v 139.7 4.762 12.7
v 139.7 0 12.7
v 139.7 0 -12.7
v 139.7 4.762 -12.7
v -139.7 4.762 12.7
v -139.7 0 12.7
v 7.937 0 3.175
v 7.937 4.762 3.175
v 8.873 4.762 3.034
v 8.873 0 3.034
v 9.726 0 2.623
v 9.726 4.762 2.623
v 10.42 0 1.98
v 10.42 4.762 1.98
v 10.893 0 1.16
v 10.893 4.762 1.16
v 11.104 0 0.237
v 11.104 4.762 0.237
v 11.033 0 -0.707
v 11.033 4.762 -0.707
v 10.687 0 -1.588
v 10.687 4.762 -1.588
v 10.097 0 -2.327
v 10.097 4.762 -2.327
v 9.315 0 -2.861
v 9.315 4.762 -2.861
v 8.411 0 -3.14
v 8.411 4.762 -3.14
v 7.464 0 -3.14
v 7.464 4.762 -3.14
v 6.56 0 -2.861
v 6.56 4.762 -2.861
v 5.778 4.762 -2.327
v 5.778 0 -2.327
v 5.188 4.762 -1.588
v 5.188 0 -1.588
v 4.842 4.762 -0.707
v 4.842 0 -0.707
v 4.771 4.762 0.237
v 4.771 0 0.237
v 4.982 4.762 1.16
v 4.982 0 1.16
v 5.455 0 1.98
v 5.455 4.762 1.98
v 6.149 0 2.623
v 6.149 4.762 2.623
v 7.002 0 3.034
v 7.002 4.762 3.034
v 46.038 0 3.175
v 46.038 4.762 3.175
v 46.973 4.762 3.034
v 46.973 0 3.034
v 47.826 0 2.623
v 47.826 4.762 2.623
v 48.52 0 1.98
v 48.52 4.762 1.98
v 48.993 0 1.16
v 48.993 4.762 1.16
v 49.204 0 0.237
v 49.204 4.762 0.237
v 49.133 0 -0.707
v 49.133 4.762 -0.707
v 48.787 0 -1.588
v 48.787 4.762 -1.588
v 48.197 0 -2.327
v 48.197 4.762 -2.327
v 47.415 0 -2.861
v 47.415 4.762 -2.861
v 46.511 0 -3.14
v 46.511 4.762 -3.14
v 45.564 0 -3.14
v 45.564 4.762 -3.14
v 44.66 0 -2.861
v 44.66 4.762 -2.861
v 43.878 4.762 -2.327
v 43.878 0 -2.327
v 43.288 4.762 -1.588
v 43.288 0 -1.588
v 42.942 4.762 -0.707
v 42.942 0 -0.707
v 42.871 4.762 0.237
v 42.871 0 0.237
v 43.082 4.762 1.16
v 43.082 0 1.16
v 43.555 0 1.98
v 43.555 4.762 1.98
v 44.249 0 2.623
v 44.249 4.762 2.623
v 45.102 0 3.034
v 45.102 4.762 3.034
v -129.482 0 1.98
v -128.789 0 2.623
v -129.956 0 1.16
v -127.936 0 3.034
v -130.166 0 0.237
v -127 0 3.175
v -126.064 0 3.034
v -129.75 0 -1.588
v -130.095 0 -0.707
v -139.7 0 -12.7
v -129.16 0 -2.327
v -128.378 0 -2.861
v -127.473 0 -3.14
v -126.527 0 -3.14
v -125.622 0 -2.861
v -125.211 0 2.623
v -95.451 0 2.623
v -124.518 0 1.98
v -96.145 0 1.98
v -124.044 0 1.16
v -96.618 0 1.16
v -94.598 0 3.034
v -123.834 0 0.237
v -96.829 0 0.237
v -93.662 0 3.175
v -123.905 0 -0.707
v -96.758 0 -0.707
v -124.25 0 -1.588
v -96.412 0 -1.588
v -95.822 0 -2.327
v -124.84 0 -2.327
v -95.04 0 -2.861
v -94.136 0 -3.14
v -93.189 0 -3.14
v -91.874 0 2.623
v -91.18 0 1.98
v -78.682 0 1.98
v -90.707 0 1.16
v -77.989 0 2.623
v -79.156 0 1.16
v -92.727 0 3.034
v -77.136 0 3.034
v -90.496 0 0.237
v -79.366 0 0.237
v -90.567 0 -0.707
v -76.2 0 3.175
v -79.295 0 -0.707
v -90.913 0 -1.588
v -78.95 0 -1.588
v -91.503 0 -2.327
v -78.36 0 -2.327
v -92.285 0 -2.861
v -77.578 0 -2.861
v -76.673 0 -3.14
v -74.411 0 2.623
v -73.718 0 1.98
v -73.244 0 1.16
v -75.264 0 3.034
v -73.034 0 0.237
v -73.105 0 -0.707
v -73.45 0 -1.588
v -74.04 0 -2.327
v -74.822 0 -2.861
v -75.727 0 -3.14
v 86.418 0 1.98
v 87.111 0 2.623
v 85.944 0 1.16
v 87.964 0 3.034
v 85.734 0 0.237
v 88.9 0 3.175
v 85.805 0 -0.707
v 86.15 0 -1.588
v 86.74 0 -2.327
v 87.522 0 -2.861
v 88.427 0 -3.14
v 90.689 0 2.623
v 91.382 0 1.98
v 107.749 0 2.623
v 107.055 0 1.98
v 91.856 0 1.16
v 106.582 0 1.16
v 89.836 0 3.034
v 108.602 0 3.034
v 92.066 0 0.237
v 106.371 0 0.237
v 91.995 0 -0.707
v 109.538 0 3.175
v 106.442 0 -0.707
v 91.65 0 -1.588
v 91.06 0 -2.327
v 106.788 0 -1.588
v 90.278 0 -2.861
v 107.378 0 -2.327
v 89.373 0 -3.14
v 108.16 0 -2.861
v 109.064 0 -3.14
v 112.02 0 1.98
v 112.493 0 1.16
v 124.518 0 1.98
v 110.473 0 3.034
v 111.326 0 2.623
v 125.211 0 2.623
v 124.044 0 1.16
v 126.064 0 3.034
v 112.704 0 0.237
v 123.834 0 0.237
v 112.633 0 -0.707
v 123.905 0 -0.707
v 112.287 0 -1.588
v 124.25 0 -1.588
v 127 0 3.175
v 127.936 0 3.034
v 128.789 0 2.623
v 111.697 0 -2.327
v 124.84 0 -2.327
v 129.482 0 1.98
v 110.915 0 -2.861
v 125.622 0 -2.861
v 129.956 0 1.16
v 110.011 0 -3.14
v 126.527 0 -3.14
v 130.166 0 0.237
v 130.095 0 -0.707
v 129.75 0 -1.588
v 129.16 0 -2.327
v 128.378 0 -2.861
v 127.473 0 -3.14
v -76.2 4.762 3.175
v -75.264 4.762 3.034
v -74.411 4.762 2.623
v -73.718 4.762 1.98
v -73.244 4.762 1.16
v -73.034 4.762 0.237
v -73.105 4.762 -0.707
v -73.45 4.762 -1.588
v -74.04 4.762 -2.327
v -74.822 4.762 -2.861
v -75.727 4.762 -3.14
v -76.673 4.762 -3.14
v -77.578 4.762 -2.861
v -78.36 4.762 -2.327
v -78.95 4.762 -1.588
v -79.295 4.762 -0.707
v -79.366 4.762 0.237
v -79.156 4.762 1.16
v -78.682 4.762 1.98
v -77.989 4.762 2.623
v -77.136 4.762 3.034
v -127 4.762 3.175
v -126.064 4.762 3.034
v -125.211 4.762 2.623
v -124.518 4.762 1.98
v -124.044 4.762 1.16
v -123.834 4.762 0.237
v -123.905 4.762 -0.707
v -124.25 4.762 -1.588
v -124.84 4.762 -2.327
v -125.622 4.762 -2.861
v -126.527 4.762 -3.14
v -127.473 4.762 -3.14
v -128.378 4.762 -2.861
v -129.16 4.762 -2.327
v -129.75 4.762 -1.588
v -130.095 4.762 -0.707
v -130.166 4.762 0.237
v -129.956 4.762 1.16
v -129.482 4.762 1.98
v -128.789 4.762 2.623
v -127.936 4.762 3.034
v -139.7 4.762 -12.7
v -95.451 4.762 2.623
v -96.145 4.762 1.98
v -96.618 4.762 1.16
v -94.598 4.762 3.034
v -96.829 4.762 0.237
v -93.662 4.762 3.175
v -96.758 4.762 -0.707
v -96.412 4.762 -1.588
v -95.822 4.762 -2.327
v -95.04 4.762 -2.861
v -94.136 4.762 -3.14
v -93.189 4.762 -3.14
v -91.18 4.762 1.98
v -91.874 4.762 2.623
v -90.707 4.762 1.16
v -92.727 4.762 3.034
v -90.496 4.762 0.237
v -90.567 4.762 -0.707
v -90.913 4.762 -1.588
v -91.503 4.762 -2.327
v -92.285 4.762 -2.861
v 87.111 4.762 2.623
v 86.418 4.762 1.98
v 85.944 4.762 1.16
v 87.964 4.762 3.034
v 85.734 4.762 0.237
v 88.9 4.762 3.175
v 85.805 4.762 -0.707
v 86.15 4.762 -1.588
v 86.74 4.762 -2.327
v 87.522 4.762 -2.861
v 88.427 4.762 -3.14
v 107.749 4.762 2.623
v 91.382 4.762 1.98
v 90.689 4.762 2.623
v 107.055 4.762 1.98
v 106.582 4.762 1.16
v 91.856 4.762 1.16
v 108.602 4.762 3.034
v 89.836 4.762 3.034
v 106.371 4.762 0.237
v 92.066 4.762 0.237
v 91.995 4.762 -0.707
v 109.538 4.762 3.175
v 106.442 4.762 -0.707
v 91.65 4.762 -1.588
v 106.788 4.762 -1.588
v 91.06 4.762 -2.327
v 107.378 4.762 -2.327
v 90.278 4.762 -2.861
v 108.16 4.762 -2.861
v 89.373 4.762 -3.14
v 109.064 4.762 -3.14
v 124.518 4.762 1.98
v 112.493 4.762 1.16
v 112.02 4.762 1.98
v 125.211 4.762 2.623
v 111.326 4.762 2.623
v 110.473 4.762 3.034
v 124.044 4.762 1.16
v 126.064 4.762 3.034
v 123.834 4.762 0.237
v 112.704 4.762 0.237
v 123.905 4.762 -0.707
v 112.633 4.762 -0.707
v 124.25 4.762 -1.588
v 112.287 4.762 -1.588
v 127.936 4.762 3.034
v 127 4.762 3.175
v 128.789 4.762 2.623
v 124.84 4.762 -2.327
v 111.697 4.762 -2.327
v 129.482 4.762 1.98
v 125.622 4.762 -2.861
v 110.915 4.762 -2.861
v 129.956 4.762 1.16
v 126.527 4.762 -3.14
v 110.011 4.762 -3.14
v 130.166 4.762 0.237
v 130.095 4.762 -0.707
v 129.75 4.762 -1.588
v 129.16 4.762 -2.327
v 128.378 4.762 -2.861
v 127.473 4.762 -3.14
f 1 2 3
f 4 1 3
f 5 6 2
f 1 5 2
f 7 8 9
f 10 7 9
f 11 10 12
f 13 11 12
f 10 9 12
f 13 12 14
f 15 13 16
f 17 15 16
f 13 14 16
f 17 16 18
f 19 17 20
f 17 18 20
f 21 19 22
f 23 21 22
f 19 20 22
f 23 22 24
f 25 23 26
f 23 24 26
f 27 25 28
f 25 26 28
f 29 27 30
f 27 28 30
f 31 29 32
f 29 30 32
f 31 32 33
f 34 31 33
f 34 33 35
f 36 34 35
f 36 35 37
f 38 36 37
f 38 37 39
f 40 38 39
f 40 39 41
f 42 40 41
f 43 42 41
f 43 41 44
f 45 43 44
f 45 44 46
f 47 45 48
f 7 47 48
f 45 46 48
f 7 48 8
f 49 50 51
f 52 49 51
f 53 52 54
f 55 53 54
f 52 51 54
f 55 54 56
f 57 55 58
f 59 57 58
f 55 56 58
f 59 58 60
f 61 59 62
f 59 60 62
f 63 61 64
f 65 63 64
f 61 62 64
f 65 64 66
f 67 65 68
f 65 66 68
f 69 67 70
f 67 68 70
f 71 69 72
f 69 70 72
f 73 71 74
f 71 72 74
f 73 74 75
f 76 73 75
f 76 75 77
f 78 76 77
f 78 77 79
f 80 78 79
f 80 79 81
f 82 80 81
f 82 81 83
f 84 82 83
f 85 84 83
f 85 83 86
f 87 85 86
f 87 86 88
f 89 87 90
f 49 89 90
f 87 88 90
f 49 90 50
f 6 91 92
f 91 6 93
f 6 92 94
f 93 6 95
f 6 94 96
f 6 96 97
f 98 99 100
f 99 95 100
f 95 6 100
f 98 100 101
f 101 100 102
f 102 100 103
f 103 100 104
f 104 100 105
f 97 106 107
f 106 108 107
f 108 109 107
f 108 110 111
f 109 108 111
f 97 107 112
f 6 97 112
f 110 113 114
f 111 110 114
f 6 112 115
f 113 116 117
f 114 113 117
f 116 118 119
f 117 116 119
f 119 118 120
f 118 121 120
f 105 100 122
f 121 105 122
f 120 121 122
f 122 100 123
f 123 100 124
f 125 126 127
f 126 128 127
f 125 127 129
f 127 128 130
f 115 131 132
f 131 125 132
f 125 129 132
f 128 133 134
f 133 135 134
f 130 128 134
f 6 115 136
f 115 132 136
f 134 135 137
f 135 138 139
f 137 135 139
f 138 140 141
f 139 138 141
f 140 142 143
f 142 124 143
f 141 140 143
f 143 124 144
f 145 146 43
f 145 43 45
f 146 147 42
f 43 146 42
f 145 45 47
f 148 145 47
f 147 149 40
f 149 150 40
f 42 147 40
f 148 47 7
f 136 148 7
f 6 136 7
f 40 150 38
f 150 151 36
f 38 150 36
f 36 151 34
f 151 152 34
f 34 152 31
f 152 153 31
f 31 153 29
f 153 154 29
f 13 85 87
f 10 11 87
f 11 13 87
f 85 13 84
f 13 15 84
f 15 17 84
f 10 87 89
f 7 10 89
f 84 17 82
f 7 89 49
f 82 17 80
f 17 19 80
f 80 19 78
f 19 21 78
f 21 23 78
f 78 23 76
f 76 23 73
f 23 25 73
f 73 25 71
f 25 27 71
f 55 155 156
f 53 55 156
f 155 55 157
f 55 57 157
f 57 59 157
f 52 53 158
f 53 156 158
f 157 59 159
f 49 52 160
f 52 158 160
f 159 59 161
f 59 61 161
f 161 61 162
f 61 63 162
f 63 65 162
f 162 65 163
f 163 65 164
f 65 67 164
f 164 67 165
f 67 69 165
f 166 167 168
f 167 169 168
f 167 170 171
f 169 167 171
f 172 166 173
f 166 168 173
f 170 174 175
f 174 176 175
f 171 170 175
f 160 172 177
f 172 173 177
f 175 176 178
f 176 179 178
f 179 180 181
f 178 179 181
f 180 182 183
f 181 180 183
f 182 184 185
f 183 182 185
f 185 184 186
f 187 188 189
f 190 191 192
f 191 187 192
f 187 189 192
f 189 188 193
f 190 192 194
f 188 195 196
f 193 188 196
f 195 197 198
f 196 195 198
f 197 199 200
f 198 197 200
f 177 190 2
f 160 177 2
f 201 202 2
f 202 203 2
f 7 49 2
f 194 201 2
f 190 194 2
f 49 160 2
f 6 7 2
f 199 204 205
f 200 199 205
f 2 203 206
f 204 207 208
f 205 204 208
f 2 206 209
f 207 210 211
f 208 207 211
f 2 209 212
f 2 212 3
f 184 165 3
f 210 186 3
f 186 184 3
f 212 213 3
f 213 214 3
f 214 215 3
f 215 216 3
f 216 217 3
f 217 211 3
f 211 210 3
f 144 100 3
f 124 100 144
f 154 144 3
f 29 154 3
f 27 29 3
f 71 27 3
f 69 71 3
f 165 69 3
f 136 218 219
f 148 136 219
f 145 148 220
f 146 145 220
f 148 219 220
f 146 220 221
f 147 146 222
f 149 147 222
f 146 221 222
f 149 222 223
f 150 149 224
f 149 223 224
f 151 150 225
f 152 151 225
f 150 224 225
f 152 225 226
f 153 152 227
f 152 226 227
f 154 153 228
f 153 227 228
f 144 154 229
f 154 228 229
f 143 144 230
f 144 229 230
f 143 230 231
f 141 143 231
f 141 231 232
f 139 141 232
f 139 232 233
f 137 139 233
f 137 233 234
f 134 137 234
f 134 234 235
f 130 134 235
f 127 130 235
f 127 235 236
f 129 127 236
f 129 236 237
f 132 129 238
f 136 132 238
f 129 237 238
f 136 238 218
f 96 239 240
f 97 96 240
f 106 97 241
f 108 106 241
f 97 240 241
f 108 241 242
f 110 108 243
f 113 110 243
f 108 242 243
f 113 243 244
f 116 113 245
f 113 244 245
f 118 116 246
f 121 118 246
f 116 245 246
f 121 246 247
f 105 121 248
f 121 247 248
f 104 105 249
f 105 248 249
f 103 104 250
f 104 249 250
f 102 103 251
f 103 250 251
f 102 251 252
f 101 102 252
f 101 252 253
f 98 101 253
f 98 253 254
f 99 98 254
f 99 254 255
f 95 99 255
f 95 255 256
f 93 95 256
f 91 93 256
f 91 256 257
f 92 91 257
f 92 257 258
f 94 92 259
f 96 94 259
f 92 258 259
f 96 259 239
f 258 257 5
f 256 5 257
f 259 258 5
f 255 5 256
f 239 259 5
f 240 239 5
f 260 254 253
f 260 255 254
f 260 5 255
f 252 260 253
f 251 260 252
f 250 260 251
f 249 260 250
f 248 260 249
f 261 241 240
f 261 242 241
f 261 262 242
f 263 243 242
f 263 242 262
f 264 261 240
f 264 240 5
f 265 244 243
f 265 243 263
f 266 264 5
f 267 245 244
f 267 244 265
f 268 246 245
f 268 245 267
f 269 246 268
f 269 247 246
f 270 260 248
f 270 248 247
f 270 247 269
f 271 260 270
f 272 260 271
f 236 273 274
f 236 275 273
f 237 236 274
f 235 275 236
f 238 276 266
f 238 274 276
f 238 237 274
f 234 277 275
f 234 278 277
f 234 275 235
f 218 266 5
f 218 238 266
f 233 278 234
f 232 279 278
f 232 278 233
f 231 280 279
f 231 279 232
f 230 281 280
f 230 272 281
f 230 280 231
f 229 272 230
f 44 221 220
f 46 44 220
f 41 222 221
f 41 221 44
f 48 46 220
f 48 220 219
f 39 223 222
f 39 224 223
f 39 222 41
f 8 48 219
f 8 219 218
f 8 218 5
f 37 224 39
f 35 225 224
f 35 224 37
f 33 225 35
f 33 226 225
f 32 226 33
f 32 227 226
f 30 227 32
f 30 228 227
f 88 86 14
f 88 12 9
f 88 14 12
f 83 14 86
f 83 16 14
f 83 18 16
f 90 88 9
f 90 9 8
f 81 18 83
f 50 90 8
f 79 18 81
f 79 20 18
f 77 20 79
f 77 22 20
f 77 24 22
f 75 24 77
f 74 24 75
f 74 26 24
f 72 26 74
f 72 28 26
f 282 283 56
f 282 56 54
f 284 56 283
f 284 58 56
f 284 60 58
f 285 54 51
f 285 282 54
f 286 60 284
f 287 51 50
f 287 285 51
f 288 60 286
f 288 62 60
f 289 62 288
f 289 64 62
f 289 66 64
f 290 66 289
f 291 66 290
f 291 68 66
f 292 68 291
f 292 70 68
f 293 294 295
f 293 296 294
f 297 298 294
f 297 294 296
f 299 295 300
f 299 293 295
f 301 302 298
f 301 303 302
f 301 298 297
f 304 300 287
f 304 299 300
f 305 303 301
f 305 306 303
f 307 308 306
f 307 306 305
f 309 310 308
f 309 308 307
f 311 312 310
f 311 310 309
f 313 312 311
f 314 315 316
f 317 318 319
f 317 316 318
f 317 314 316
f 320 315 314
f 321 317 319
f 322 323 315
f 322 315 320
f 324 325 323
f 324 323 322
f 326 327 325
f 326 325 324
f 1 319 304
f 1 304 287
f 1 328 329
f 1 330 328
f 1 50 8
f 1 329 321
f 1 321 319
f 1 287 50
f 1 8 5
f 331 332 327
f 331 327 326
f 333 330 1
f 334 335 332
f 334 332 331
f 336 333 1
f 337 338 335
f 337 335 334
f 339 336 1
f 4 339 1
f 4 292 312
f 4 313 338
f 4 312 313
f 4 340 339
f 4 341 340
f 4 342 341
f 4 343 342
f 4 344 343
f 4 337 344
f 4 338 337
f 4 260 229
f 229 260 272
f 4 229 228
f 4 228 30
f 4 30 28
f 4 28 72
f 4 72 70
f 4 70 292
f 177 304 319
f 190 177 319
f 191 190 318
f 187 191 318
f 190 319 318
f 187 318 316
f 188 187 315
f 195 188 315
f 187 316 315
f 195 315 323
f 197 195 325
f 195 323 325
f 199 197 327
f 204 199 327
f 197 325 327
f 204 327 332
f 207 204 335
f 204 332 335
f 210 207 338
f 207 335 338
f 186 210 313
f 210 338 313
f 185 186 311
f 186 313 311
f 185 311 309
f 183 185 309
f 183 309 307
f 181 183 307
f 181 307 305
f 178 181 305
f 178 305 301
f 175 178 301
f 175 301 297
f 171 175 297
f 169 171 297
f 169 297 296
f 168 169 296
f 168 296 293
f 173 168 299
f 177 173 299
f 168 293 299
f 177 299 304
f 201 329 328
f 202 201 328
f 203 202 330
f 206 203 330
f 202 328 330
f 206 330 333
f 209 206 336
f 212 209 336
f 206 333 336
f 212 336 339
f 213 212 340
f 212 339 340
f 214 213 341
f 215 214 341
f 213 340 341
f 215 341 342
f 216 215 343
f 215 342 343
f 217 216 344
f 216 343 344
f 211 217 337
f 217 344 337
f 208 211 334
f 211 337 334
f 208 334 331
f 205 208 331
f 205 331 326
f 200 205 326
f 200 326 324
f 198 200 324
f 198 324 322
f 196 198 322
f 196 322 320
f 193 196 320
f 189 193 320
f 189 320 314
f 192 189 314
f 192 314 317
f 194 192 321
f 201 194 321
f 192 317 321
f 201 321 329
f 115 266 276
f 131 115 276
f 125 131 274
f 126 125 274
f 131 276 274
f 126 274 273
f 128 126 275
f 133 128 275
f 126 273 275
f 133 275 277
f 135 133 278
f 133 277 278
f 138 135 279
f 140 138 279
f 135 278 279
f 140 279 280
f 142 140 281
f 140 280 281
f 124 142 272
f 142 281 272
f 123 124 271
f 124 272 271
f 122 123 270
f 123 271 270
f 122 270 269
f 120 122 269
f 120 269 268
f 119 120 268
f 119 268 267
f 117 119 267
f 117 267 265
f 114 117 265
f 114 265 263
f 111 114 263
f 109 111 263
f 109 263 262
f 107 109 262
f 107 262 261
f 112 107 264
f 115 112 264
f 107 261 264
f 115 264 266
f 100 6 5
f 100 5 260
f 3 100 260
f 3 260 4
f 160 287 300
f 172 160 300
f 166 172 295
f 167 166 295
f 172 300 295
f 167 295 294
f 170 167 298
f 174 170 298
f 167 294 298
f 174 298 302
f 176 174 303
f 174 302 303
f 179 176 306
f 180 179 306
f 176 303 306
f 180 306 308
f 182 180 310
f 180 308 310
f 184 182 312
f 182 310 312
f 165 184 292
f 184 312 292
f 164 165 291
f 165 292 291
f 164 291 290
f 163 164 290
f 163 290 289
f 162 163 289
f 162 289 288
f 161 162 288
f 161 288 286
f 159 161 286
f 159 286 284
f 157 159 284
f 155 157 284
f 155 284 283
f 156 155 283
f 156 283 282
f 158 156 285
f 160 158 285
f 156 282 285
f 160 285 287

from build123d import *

# Parameters (mm, degrees)
SKETCH1_W           = 279.4
SKETCH1_H           = 25.4
BOSS_EXTRUDE1_DEPTH = 4.7625
SKETCH8_R           = 3.175
CUT_EXTRUDE6_DEPTH  = 4.7625


with BuildPart() as part:
    # Sketch1 → Boss-Extrude1 (new body)
    with BuildSketch(Plane(origin=(0, 0, 0), x_dir=(1, 0, 0), z_dir=(0, 1, 0))):
        Rectangle(SKETCH1_W, SKETCH1_H)
    extrude(amount=BOSS_EXTRUDE1_DEPTH)

    # Sketch8 → Cut-Extrude6 (cut)
    with BuildSketch(Plane(origin=(0, 4.7625, 0), x_dir=(1, 0, 0), z_dir=(0, 1, 0))):
        with Locations(Location((127, 0, 0), (0, 0, 270))):
            Circle(SKETCH8_R)
        with Locations(Location((109.5375, 0, 0), (0, 0, 270))):
            Circle(SKETCH8_R)
        with Locations(Location((88.9, 0, 0), (0, 0, 270))):
            Circle(SKETCH8_R)
        with Locations(Location((46.0375, 0, 0), (0, 0, 270))):
            Circle(SKETCH8_R)
        with Locations(Location((7.9375, 0, 0), (0, 0, 270))):
            Circle(SKETCH8_R)
        with Locations(Location((-76.2, 0, 0), (0, 0, 270))):
            Circle(SKETCH8_R)
        with Locations(Location((-127, 0, 0), (0, 0, 270))):
            Circle(SKETCH8_R)
        with Locations(Location((-93.6625, 0, 0), (0, 0, 270))):
            Circle(SKETCH8_R)
    extrude(amount=-CUT_EXTRUDE6_DEPTH, mode=Mode.SUBTRACT)


solid = part.part
